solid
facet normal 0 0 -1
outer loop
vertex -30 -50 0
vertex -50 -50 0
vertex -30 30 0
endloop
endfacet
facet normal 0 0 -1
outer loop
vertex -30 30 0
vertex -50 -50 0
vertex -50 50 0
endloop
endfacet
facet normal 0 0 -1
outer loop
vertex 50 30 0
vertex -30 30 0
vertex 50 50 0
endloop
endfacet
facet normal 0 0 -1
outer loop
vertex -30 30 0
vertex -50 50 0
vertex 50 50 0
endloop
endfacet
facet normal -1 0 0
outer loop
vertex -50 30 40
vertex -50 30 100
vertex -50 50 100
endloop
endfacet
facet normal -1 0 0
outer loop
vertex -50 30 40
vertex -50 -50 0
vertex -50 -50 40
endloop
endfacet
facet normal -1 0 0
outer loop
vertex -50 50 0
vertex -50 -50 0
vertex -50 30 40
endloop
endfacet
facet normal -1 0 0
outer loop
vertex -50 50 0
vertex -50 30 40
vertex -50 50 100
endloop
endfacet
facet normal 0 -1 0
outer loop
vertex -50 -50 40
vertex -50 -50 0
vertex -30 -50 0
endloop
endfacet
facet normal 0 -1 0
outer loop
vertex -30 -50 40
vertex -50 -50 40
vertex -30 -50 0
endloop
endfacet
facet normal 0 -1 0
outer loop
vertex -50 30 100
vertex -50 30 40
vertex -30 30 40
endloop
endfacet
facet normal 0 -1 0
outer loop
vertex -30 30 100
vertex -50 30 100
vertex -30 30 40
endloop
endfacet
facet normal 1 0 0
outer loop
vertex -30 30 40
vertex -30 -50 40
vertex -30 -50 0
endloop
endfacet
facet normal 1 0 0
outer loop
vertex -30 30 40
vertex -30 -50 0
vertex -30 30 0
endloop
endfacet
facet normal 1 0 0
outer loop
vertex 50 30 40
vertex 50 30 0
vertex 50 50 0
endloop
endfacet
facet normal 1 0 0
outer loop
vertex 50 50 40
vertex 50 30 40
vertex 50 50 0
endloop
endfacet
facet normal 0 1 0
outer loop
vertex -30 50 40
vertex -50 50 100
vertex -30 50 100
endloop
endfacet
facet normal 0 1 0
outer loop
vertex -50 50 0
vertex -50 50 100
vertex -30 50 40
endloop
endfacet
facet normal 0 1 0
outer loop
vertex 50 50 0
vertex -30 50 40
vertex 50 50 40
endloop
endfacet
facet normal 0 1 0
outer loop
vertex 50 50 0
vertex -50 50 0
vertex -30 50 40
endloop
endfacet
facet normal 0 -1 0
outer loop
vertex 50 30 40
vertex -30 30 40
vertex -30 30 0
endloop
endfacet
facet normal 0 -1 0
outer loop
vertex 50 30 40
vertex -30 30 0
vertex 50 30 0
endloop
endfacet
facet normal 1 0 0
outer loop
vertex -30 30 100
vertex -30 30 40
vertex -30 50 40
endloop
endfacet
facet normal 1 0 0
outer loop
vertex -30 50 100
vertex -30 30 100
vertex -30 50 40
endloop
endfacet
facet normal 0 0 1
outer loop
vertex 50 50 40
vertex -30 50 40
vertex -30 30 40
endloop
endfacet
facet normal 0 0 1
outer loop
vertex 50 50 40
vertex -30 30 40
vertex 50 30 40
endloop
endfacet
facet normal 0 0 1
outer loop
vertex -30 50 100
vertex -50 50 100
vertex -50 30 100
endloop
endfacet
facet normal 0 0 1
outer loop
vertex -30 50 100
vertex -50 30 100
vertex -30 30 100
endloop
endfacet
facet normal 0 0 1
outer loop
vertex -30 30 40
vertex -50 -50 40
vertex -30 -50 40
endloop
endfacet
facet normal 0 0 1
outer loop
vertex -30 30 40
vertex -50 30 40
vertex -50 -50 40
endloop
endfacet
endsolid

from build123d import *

# Parameters (mm, degrees)
F0_W     = 100
F0_H     = 100
F1_DEPTH = 15
F3_DEPTH = 25
F4_R     = 30
F5_DEPTH = 15.001
F6_W     = 20
F6_H     = 20
F7_DEPTH = 60
F8_W     = 80
F8_H     = 80
F9_DEPTH = 15.001


with BuildPart() as f1:
    # F0 (on Top) → F1 (new body)
    with BuildSketch(Plane.XY):
        Rectangle(F0_W, F0_H)
    extrude(amount=F1_DEPTH)

    # F2 (on face) → F3 (join)
    with BuildSketch(Plane.XY.offset(15)):
        Polygon((-30, -50), (-30, 30), (50, 30), (50, 50), (-50, 50), (-50, -50), align=None)
    extrude(amount=F3_DEPTH)

    # F4 (on face) → F5 (cut, through all)
    with BuildSketch(Plane.XY.offset(15)):
        with Locations((10, -10)):
            Circle(F4_R)
    extrude(amount=-F5_DEPTH, mode=Mode.SUBTRACT)

    # F6 (on face) → F7 (join)
    with BuildSketch(Plane.XY.offset(40)):
        with Locations((-40, 40)):
            Rectangle(F6_W, F6_H)
    extrude(amount=F7_DEPTH)

    # F8 (on face) → F9 (cut, through all)
    with BuildSketch(Plane.XY.offset(15)):
        with Locations((10, -10)):
            Rectangle(F8_W, F8_H)
    extrude(amount=-F9_DEPTH, mode=Mode.SUBTRACT)


solid = f1.part
